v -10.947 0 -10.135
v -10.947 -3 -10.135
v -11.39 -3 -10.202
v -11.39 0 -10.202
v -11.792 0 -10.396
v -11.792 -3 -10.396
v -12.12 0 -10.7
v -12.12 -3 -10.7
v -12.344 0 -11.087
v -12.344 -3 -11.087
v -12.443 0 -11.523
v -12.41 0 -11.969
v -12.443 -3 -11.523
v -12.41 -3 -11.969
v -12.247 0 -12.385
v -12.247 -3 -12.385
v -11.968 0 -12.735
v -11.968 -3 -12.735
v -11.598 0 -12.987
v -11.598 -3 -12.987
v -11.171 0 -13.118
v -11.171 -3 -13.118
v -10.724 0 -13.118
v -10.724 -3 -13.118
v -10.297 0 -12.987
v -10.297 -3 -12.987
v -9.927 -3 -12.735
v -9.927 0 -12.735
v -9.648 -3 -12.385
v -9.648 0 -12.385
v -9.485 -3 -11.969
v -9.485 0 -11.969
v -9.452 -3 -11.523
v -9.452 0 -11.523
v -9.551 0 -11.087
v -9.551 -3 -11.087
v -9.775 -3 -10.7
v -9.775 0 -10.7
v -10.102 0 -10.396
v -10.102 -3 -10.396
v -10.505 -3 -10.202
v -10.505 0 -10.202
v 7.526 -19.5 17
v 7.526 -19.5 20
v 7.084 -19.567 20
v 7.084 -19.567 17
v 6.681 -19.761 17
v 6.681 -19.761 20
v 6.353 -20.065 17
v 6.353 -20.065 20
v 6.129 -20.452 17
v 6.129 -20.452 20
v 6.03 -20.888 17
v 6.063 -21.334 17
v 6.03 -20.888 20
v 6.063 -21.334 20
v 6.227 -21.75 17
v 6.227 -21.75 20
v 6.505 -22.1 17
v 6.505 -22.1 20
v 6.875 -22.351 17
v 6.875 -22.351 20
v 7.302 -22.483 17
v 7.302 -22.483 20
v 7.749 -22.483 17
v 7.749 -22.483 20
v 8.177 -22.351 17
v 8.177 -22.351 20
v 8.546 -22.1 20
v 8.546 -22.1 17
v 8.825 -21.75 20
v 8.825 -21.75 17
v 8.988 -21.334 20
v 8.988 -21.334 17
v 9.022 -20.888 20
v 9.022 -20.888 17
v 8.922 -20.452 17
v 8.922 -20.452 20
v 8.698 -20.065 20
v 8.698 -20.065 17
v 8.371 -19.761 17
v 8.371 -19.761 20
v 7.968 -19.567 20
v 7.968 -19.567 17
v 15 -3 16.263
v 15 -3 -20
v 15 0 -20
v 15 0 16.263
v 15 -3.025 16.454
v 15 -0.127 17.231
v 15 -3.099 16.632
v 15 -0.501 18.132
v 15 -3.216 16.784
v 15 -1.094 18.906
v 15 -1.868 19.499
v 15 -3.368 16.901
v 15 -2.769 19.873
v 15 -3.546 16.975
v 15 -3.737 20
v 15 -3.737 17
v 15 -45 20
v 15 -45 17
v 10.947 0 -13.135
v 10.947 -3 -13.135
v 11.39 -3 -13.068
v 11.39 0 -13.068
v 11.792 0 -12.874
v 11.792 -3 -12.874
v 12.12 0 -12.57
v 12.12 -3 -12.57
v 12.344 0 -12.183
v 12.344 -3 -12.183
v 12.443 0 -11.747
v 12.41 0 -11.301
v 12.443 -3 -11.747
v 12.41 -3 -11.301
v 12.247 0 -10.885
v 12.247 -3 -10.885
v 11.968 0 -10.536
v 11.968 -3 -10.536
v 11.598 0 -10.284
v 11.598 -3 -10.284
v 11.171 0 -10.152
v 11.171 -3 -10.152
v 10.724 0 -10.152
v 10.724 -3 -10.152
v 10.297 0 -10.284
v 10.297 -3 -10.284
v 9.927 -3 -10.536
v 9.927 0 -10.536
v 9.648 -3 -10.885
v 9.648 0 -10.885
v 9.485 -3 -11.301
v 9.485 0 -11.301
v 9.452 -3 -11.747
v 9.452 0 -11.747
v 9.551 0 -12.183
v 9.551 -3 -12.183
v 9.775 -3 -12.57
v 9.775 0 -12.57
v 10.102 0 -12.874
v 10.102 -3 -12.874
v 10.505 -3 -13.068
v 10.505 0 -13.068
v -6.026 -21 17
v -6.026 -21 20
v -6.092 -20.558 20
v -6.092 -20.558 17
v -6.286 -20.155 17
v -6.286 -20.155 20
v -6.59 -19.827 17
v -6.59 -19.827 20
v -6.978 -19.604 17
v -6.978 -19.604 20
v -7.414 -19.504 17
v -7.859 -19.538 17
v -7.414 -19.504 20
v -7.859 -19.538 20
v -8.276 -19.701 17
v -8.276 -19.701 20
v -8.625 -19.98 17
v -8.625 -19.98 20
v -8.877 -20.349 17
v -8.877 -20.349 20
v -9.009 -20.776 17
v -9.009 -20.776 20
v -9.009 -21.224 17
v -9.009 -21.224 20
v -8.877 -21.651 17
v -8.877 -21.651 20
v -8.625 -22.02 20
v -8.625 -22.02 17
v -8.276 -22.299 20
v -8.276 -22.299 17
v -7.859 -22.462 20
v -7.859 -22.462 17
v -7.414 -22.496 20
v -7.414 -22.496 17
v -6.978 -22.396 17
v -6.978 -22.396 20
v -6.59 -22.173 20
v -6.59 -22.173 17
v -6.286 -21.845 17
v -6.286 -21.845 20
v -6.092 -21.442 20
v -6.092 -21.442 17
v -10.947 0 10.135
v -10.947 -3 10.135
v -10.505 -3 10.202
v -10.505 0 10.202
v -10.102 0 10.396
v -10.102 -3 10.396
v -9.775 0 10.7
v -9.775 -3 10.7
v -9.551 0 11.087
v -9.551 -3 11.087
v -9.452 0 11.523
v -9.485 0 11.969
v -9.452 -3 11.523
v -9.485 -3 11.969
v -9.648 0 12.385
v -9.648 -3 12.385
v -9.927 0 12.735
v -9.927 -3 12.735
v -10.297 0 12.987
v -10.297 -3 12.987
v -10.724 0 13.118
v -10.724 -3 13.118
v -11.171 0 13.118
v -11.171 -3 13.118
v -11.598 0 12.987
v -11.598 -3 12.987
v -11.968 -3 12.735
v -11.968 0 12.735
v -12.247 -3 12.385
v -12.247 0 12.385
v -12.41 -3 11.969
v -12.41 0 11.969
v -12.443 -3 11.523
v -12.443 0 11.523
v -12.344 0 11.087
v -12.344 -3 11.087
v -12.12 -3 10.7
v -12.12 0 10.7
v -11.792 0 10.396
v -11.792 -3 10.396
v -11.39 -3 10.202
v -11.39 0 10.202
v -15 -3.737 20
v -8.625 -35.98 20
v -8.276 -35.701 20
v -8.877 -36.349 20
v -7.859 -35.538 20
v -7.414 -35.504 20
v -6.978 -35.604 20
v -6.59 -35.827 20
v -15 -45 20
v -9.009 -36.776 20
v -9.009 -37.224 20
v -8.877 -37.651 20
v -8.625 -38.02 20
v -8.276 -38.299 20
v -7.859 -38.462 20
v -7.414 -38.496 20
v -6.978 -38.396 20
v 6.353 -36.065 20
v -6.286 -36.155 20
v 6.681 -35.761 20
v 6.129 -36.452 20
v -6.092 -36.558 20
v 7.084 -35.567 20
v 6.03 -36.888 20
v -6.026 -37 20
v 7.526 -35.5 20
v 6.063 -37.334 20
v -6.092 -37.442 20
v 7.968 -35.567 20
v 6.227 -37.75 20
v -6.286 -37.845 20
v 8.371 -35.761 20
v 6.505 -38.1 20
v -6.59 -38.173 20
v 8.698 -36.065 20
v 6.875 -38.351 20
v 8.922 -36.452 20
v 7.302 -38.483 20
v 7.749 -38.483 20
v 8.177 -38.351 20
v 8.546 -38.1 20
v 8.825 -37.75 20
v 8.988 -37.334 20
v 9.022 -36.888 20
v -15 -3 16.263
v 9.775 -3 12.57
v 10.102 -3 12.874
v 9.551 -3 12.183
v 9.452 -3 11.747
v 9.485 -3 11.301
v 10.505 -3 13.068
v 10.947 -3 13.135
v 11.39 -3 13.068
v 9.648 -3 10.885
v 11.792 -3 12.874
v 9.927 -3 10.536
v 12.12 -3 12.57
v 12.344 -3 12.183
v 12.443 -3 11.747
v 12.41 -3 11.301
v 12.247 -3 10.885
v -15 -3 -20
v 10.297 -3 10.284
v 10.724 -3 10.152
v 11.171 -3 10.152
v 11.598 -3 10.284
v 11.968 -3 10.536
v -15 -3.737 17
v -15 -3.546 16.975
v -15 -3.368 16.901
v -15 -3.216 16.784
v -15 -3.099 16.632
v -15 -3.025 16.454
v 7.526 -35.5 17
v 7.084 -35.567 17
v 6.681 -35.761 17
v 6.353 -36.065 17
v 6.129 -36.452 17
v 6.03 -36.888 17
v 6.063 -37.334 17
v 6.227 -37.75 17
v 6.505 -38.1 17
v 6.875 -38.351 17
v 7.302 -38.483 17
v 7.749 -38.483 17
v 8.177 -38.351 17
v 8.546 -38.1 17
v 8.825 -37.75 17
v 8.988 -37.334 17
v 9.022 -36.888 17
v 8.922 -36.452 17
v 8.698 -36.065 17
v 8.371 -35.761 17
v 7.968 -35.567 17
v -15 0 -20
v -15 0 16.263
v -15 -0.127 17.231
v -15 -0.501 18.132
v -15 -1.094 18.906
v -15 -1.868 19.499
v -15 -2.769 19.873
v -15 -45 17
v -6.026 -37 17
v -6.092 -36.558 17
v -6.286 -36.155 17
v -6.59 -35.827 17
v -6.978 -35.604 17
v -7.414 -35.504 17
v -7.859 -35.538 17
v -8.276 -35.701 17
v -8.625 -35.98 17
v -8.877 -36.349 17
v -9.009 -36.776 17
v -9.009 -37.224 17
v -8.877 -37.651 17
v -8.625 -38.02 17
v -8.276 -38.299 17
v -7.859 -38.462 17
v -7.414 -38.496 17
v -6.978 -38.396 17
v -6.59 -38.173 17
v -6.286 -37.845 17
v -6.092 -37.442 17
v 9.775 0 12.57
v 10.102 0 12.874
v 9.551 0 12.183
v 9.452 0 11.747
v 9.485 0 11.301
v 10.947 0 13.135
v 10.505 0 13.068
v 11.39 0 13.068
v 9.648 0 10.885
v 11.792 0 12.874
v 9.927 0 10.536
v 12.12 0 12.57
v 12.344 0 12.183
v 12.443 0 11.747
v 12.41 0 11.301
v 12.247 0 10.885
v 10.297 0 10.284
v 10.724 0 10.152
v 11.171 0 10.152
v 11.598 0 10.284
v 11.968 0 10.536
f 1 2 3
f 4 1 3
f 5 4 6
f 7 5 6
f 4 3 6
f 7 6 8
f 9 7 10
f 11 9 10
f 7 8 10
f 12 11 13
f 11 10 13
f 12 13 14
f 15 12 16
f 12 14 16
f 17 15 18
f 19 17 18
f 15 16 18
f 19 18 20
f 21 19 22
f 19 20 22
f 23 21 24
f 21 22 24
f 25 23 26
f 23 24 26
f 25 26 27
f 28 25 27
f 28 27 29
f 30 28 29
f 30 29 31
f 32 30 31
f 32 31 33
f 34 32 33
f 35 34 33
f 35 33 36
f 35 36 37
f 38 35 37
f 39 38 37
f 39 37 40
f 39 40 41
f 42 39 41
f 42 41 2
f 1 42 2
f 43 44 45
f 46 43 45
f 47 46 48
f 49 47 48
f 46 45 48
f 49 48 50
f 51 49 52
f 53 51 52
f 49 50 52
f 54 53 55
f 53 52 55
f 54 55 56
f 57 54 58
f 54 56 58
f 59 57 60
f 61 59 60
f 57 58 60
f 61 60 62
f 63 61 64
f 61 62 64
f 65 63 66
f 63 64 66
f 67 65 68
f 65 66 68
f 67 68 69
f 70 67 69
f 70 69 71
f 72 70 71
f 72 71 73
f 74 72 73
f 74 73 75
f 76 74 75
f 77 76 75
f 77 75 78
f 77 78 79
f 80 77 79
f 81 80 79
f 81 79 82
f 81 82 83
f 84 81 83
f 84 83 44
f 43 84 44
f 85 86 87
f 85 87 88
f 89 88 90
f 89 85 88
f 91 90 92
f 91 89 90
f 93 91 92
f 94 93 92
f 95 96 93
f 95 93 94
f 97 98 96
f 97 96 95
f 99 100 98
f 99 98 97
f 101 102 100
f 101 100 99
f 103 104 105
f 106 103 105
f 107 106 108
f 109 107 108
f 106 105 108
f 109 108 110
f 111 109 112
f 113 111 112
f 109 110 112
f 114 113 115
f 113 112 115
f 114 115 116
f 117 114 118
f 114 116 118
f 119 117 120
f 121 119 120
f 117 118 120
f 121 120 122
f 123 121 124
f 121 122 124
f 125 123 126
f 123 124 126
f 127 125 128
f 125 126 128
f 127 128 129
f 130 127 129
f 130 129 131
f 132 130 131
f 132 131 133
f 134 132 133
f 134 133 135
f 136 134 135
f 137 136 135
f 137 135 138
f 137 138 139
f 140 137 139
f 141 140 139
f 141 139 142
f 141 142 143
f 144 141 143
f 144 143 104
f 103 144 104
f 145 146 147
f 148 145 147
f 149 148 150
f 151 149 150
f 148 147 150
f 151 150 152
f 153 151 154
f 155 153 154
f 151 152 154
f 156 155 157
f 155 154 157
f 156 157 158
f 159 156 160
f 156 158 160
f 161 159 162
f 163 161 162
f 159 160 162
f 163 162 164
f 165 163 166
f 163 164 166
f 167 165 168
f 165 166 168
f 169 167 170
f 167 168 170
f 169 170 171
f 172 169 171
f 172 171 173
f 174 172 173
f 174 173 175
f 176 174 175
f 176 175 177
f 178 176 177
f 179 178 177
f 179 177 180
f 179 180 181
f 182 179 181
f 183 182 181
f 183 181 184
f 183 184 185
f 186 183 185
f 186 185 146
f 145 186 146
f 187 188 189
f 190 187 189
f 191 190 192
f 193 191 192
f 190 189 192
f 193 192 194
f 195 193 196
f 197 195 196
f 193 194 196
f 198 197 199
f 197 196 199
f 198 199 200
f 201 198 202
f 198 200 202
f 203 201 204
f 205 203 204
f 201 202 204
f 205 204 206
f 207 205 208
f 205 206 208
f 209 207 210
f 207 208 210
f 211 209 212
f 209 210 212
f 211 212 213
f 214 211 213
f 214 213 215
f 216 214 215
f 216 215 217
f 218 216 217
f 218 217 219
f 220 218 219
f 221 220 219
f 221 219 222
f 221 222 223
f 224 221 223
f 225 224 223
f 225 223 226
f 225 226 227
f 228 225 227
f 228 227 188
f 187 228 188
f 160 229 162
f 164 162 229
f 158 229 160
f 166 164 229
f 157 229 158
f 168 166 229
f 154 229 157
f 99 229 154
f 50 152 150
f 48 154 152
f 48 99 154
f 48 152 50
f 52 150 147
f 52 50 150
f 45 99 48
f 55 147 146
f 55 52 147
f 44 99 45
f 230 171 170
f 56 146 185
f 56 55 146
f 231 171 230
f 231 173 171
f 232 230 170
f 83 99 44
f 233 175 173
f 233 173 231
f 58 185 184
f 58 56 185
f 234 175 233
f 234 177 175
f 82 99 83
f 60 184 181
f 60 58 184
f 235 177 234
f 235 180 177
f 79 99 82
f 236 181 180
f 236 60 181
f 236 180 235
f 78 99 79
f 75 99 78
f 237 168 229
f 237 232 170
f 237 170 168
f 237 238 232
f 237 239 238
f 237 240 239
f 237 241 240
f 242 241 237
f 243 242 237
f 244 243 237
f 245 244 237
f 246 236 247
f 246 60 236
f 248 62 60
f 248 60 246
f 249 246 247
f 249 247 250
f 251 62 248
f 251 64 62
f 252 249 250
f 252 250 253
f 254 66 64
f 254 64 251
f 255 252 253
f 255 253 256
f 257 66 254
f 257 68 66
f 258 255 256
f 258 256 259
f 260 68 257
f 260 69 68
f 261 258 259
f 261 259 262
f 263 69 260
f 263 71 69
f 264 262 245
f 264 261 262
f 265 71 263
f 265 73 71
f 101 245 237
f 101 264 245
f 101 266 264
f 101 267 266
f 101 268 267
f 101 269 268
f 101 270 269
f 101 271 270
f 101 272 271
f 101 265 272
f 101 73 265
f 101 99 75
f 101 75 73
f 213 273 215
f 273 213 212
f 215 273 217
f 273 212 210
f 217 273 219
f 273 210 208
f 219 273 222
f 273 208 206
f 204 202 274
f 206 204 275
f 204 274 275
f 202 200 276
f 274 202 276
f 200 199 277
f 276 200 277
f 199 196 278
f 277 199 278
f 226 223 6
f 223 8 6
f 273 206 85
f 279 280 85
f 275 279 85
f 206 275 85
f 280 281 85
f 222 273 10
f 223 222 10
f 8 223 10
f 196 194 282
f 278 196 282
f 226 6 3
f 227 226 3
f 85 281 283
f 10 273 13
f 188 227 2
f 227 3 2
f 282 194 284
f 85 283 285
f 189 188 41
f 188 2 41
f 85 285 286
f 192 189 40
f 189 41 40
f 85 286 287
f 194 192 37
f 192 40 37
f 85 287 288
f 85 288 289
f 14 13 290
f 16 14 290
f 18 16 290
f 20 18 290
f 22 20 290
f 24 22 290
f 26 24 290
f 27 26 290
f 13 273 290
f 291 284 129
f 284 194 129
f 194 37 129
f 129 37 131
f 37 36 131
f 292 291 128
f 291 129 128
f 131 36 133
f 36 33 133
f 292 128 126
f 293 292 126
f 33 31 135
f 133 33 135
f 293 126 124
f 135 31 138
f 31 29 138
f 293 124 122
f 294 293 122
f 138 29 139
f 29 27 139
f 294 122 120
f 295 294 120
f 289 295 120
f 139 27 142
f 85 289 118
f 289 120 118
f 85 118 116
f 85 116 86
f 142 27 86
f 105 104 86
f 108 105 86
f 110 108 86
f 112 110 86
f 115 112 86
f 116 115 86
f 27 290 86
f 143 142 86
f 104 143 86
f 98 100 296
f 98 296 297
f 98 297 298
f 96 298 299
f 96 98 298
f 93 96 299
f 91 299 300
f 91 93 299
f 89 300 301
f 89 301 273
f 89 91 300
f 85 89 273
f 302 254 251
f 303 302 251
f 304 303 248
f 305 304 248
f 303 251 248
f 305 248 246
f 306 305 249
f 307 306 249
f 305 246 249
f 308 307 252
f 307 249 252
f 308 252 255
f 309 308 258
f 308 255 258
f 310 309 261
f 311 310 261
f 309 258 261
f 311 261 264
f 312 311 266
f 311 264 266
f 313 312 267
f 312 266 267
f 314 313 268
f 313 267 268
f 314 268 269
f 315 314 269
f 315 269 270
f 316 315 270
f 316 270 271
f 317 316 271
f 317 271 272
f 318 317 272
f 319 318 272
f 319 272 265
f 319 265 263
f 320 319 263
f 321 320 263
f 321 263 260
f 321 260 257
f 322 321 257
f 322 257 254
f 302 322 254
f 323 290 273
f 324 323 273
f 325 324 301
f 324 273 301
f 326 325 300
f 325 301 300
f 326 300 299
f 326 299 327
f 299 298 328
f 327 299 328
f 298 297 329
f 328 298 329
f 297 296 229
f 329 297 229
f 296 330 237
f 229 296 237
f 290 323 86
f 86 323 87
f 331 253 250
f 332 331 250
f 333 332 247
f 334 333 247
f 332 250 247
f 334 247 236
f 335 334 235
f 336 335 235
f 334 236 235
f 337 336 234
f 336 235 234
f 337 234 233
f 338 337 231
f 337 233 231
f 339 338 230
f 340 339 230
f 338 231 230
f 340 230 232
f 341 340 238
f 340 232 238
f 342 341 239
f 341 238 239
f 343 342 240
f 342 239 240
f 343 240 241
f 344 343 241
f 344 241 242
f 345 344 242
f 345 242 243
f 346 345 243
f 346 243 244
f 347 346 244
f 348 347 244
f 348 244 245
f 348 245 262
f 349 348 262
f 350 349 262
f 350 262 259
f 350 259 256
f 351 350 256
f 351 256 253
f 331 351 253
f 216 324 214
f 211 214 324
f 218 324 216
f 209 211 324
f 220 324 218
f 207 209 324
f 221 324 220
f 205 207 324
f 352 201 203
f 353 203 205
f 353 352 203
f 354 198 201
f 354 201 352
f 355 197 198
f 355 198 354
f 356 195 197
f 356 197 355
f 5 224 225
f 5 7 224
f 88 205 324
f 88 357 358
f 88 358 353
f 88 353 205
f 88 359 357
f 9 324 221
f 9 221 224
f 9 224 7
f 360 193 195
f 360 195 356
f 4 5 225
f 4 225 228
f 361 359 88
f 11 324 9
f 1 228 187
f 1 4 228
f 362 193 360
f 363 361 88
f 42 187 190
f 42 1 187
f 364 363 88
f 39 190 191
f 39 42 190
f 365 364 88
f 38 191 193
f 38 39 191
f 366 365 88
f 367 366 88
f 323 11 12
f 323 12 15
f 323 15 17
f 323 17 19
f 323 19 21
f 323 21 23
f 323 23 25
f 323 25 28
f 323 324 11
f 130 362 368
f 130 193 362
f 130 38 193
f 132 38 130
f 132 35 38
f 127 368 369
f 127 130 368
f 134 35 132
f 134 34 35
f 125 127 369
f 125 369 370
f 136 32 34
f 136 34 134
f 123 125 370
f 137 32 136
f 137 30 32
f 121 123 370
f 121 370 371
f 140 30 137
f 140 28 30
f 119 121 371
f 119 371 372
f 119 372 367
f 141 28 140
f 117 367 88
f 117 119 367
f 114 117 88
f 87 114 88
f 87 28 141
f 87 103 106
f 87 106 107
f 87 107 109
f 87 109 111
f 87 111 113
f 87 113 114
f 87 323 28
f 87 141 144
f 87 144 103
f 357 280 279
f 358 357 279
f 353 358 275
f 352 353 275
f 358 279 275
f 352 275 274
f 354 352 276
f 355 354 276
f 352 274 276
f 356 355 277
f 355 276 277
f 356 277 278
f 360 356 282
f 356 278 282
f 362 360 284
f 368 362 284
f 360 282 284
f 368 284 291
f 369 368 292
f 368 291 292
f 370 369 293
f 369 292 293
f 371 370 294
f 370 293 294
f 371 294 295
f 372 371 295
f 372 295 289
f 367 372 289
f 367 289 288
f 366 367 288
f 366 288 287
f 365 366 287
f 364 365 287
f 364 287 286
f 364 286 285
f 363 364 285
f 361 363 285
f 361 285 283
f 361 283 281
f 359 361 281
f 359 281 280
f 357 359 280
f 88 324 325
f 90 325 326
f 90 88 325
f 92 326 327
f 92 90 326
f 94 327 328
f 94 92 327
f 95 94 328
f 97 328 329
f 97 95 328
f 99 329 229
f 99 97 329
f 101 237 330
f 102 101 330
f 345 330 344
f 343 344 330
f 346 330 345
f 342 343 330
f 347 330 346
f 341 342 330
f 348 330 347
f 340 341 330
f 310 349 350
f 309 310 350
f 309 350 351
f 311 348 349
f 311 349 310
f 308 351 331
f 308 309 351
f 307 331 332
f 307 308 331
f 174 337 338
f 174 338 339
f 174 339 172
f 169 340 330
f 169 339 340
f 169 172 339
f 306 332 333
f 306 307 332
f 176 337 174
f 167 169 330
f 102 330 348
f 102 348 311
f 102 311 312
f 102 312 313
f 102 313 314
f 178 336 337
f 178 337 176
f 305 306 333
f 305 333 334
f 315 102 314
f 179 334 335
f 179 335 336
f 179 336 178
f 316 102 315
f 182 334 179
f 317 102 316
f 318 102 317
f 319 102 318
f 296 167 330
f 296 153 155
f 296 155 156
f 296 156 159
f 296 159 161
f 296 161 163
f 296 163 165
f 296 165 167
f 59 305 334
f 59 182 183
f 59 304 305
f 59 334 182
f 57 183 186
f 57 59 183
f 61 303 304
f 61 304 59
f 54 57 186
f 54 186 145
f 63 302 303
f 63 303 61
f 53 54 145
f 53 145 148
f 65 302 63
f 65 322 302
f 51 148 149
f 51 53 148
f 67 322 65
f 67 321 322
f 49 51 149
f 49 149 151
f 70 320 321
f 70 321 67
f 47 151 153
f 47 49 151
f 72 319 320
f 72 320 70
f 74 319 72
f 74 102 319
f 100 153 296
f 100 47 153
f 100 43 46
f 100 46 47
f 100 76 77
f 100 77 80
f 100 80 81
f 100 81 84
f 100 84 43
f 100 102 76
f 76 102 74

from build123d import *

# Parameters (mm, degrees)
SKETCH1_W                    = 30
SKETCH1_H                    = 40
BASE_FLANGE1_DEPTH           = 3
EDGE_FLANGE1_STRIP_W         = 13.4732
EDGE_FLANGE1_STRIP_H         = 3
EDGE_FLANGE1_STRIP_CUT_DEPTH = 30
EDGE_FLANGE1_DEPTH           = 30
SKETCH9_R                    = 1.5
CUT_EXTRUDE1_DEPTH           = 10
SKETCH10_R                   = 1.5
CUT_EXTRUDE2_DEPTH           = 10


# Sheet-metal steps are written as plain solids
with BuildPart() as part:
    # Sketch1 → Base-Flange1 (new body)
    with BuildSketch(Plane(origin=(0, 0, 0), x_dir=(1, 0, 0), z_dir=(0, 1, 0))):
        Rectangle(SKETCH1_W, SKETCH1_H)
    extrude(amount=-BASE_FLANGE1_DEPTH)

    # Edge-Flange1 strip (across the edge) → Edge-Flange1 strip cut (cut)
    with BuildSketch(Plane(origin=(15, -3, 20), x_dir=(0, 0, -1), z_dir=(-1, 0, 0))):
        with Locations((-3, -1.5)):
            Rectangle(EDGE_FLANGE1_STRIP_W, EDGE_FLANGE1_STRIP_H)
    extrude(amount=EDGE_FLANGE1_STRIP_CUT_DEPTH, mode=Mode.SUBTRACT)

    # Edge-Flange1 section (across the edge) → Edge-Flange1 (add)
    with BuildSketch(Plane(origin=(15, -3, 20), x_dir=(0, 0, -1), z_dir=(-1, 0, 0))):
        with BuildLine():
            Line((0, 0.7366), (0, 42))
            Line((0, 42), (3, 42))
            Line((3, 42), (3, 0.7366))
            ThreePointArc((3, 0.7366), (3.215745145, 0.215745145), (3.7366, 0))
            Line((3.7366, 0), (3.7366, -3))
            ThreePointArc((3.7366, -3), (1.094424801, -1.905575199), (0, 0.7366))
        make_face()
    extrude(amount=EDGE_FLANGE1_DEPTH)

    # Sketch9 → Cut-Extrude1 (cut)
    with BuildSketch(Plane.XY.offset(20)):
        with Locations((-7.525698427, -21)):
            Circle(SKETCH9_R)
        with Locations((-7.525698427, -37)):
            Circle(SKETCH9_R)
        with Locations(Location((7.525698427, -37, 0), (0, 0, 90))):
            Circle(SKETCH9_R)
        with Locations(Location((7.525698427, -21, 0), (0, 0, 90))):
            Circle(SKETCH9_R)
    extrude(amount=-CUT_EXTRUDE1_DEPTH, mode=Mode.SUBTRACT)

    # Sketch10 → Cut-Extrude2 (cut)
    with BuildSketch(Plane.XZ.offset(3)):
        with Locations(Location((-10.947470665, 11.635125857, 0), (0, 0, 270))):
            Circle(SKETCH10_R)
        with Locations(Location((10.947470665, 11.635125857, 0), (0, 0, 90))):
            Circle(SKETCH10_R)
        with Locations(Location((10.947470665, -11.635125857, 0), (0, 0, 270))):
            Circle(SKETCH10_R)
        with Locations(Location((-10.947470665, -11.635125857, 0), (0, 0, 90))):
            Circle(SKETCH10_R)
    extrude(amount=-CUT_EXTRUDE2_DEPTH, mode=Mode.SUBTRACT)


solid = part.part
